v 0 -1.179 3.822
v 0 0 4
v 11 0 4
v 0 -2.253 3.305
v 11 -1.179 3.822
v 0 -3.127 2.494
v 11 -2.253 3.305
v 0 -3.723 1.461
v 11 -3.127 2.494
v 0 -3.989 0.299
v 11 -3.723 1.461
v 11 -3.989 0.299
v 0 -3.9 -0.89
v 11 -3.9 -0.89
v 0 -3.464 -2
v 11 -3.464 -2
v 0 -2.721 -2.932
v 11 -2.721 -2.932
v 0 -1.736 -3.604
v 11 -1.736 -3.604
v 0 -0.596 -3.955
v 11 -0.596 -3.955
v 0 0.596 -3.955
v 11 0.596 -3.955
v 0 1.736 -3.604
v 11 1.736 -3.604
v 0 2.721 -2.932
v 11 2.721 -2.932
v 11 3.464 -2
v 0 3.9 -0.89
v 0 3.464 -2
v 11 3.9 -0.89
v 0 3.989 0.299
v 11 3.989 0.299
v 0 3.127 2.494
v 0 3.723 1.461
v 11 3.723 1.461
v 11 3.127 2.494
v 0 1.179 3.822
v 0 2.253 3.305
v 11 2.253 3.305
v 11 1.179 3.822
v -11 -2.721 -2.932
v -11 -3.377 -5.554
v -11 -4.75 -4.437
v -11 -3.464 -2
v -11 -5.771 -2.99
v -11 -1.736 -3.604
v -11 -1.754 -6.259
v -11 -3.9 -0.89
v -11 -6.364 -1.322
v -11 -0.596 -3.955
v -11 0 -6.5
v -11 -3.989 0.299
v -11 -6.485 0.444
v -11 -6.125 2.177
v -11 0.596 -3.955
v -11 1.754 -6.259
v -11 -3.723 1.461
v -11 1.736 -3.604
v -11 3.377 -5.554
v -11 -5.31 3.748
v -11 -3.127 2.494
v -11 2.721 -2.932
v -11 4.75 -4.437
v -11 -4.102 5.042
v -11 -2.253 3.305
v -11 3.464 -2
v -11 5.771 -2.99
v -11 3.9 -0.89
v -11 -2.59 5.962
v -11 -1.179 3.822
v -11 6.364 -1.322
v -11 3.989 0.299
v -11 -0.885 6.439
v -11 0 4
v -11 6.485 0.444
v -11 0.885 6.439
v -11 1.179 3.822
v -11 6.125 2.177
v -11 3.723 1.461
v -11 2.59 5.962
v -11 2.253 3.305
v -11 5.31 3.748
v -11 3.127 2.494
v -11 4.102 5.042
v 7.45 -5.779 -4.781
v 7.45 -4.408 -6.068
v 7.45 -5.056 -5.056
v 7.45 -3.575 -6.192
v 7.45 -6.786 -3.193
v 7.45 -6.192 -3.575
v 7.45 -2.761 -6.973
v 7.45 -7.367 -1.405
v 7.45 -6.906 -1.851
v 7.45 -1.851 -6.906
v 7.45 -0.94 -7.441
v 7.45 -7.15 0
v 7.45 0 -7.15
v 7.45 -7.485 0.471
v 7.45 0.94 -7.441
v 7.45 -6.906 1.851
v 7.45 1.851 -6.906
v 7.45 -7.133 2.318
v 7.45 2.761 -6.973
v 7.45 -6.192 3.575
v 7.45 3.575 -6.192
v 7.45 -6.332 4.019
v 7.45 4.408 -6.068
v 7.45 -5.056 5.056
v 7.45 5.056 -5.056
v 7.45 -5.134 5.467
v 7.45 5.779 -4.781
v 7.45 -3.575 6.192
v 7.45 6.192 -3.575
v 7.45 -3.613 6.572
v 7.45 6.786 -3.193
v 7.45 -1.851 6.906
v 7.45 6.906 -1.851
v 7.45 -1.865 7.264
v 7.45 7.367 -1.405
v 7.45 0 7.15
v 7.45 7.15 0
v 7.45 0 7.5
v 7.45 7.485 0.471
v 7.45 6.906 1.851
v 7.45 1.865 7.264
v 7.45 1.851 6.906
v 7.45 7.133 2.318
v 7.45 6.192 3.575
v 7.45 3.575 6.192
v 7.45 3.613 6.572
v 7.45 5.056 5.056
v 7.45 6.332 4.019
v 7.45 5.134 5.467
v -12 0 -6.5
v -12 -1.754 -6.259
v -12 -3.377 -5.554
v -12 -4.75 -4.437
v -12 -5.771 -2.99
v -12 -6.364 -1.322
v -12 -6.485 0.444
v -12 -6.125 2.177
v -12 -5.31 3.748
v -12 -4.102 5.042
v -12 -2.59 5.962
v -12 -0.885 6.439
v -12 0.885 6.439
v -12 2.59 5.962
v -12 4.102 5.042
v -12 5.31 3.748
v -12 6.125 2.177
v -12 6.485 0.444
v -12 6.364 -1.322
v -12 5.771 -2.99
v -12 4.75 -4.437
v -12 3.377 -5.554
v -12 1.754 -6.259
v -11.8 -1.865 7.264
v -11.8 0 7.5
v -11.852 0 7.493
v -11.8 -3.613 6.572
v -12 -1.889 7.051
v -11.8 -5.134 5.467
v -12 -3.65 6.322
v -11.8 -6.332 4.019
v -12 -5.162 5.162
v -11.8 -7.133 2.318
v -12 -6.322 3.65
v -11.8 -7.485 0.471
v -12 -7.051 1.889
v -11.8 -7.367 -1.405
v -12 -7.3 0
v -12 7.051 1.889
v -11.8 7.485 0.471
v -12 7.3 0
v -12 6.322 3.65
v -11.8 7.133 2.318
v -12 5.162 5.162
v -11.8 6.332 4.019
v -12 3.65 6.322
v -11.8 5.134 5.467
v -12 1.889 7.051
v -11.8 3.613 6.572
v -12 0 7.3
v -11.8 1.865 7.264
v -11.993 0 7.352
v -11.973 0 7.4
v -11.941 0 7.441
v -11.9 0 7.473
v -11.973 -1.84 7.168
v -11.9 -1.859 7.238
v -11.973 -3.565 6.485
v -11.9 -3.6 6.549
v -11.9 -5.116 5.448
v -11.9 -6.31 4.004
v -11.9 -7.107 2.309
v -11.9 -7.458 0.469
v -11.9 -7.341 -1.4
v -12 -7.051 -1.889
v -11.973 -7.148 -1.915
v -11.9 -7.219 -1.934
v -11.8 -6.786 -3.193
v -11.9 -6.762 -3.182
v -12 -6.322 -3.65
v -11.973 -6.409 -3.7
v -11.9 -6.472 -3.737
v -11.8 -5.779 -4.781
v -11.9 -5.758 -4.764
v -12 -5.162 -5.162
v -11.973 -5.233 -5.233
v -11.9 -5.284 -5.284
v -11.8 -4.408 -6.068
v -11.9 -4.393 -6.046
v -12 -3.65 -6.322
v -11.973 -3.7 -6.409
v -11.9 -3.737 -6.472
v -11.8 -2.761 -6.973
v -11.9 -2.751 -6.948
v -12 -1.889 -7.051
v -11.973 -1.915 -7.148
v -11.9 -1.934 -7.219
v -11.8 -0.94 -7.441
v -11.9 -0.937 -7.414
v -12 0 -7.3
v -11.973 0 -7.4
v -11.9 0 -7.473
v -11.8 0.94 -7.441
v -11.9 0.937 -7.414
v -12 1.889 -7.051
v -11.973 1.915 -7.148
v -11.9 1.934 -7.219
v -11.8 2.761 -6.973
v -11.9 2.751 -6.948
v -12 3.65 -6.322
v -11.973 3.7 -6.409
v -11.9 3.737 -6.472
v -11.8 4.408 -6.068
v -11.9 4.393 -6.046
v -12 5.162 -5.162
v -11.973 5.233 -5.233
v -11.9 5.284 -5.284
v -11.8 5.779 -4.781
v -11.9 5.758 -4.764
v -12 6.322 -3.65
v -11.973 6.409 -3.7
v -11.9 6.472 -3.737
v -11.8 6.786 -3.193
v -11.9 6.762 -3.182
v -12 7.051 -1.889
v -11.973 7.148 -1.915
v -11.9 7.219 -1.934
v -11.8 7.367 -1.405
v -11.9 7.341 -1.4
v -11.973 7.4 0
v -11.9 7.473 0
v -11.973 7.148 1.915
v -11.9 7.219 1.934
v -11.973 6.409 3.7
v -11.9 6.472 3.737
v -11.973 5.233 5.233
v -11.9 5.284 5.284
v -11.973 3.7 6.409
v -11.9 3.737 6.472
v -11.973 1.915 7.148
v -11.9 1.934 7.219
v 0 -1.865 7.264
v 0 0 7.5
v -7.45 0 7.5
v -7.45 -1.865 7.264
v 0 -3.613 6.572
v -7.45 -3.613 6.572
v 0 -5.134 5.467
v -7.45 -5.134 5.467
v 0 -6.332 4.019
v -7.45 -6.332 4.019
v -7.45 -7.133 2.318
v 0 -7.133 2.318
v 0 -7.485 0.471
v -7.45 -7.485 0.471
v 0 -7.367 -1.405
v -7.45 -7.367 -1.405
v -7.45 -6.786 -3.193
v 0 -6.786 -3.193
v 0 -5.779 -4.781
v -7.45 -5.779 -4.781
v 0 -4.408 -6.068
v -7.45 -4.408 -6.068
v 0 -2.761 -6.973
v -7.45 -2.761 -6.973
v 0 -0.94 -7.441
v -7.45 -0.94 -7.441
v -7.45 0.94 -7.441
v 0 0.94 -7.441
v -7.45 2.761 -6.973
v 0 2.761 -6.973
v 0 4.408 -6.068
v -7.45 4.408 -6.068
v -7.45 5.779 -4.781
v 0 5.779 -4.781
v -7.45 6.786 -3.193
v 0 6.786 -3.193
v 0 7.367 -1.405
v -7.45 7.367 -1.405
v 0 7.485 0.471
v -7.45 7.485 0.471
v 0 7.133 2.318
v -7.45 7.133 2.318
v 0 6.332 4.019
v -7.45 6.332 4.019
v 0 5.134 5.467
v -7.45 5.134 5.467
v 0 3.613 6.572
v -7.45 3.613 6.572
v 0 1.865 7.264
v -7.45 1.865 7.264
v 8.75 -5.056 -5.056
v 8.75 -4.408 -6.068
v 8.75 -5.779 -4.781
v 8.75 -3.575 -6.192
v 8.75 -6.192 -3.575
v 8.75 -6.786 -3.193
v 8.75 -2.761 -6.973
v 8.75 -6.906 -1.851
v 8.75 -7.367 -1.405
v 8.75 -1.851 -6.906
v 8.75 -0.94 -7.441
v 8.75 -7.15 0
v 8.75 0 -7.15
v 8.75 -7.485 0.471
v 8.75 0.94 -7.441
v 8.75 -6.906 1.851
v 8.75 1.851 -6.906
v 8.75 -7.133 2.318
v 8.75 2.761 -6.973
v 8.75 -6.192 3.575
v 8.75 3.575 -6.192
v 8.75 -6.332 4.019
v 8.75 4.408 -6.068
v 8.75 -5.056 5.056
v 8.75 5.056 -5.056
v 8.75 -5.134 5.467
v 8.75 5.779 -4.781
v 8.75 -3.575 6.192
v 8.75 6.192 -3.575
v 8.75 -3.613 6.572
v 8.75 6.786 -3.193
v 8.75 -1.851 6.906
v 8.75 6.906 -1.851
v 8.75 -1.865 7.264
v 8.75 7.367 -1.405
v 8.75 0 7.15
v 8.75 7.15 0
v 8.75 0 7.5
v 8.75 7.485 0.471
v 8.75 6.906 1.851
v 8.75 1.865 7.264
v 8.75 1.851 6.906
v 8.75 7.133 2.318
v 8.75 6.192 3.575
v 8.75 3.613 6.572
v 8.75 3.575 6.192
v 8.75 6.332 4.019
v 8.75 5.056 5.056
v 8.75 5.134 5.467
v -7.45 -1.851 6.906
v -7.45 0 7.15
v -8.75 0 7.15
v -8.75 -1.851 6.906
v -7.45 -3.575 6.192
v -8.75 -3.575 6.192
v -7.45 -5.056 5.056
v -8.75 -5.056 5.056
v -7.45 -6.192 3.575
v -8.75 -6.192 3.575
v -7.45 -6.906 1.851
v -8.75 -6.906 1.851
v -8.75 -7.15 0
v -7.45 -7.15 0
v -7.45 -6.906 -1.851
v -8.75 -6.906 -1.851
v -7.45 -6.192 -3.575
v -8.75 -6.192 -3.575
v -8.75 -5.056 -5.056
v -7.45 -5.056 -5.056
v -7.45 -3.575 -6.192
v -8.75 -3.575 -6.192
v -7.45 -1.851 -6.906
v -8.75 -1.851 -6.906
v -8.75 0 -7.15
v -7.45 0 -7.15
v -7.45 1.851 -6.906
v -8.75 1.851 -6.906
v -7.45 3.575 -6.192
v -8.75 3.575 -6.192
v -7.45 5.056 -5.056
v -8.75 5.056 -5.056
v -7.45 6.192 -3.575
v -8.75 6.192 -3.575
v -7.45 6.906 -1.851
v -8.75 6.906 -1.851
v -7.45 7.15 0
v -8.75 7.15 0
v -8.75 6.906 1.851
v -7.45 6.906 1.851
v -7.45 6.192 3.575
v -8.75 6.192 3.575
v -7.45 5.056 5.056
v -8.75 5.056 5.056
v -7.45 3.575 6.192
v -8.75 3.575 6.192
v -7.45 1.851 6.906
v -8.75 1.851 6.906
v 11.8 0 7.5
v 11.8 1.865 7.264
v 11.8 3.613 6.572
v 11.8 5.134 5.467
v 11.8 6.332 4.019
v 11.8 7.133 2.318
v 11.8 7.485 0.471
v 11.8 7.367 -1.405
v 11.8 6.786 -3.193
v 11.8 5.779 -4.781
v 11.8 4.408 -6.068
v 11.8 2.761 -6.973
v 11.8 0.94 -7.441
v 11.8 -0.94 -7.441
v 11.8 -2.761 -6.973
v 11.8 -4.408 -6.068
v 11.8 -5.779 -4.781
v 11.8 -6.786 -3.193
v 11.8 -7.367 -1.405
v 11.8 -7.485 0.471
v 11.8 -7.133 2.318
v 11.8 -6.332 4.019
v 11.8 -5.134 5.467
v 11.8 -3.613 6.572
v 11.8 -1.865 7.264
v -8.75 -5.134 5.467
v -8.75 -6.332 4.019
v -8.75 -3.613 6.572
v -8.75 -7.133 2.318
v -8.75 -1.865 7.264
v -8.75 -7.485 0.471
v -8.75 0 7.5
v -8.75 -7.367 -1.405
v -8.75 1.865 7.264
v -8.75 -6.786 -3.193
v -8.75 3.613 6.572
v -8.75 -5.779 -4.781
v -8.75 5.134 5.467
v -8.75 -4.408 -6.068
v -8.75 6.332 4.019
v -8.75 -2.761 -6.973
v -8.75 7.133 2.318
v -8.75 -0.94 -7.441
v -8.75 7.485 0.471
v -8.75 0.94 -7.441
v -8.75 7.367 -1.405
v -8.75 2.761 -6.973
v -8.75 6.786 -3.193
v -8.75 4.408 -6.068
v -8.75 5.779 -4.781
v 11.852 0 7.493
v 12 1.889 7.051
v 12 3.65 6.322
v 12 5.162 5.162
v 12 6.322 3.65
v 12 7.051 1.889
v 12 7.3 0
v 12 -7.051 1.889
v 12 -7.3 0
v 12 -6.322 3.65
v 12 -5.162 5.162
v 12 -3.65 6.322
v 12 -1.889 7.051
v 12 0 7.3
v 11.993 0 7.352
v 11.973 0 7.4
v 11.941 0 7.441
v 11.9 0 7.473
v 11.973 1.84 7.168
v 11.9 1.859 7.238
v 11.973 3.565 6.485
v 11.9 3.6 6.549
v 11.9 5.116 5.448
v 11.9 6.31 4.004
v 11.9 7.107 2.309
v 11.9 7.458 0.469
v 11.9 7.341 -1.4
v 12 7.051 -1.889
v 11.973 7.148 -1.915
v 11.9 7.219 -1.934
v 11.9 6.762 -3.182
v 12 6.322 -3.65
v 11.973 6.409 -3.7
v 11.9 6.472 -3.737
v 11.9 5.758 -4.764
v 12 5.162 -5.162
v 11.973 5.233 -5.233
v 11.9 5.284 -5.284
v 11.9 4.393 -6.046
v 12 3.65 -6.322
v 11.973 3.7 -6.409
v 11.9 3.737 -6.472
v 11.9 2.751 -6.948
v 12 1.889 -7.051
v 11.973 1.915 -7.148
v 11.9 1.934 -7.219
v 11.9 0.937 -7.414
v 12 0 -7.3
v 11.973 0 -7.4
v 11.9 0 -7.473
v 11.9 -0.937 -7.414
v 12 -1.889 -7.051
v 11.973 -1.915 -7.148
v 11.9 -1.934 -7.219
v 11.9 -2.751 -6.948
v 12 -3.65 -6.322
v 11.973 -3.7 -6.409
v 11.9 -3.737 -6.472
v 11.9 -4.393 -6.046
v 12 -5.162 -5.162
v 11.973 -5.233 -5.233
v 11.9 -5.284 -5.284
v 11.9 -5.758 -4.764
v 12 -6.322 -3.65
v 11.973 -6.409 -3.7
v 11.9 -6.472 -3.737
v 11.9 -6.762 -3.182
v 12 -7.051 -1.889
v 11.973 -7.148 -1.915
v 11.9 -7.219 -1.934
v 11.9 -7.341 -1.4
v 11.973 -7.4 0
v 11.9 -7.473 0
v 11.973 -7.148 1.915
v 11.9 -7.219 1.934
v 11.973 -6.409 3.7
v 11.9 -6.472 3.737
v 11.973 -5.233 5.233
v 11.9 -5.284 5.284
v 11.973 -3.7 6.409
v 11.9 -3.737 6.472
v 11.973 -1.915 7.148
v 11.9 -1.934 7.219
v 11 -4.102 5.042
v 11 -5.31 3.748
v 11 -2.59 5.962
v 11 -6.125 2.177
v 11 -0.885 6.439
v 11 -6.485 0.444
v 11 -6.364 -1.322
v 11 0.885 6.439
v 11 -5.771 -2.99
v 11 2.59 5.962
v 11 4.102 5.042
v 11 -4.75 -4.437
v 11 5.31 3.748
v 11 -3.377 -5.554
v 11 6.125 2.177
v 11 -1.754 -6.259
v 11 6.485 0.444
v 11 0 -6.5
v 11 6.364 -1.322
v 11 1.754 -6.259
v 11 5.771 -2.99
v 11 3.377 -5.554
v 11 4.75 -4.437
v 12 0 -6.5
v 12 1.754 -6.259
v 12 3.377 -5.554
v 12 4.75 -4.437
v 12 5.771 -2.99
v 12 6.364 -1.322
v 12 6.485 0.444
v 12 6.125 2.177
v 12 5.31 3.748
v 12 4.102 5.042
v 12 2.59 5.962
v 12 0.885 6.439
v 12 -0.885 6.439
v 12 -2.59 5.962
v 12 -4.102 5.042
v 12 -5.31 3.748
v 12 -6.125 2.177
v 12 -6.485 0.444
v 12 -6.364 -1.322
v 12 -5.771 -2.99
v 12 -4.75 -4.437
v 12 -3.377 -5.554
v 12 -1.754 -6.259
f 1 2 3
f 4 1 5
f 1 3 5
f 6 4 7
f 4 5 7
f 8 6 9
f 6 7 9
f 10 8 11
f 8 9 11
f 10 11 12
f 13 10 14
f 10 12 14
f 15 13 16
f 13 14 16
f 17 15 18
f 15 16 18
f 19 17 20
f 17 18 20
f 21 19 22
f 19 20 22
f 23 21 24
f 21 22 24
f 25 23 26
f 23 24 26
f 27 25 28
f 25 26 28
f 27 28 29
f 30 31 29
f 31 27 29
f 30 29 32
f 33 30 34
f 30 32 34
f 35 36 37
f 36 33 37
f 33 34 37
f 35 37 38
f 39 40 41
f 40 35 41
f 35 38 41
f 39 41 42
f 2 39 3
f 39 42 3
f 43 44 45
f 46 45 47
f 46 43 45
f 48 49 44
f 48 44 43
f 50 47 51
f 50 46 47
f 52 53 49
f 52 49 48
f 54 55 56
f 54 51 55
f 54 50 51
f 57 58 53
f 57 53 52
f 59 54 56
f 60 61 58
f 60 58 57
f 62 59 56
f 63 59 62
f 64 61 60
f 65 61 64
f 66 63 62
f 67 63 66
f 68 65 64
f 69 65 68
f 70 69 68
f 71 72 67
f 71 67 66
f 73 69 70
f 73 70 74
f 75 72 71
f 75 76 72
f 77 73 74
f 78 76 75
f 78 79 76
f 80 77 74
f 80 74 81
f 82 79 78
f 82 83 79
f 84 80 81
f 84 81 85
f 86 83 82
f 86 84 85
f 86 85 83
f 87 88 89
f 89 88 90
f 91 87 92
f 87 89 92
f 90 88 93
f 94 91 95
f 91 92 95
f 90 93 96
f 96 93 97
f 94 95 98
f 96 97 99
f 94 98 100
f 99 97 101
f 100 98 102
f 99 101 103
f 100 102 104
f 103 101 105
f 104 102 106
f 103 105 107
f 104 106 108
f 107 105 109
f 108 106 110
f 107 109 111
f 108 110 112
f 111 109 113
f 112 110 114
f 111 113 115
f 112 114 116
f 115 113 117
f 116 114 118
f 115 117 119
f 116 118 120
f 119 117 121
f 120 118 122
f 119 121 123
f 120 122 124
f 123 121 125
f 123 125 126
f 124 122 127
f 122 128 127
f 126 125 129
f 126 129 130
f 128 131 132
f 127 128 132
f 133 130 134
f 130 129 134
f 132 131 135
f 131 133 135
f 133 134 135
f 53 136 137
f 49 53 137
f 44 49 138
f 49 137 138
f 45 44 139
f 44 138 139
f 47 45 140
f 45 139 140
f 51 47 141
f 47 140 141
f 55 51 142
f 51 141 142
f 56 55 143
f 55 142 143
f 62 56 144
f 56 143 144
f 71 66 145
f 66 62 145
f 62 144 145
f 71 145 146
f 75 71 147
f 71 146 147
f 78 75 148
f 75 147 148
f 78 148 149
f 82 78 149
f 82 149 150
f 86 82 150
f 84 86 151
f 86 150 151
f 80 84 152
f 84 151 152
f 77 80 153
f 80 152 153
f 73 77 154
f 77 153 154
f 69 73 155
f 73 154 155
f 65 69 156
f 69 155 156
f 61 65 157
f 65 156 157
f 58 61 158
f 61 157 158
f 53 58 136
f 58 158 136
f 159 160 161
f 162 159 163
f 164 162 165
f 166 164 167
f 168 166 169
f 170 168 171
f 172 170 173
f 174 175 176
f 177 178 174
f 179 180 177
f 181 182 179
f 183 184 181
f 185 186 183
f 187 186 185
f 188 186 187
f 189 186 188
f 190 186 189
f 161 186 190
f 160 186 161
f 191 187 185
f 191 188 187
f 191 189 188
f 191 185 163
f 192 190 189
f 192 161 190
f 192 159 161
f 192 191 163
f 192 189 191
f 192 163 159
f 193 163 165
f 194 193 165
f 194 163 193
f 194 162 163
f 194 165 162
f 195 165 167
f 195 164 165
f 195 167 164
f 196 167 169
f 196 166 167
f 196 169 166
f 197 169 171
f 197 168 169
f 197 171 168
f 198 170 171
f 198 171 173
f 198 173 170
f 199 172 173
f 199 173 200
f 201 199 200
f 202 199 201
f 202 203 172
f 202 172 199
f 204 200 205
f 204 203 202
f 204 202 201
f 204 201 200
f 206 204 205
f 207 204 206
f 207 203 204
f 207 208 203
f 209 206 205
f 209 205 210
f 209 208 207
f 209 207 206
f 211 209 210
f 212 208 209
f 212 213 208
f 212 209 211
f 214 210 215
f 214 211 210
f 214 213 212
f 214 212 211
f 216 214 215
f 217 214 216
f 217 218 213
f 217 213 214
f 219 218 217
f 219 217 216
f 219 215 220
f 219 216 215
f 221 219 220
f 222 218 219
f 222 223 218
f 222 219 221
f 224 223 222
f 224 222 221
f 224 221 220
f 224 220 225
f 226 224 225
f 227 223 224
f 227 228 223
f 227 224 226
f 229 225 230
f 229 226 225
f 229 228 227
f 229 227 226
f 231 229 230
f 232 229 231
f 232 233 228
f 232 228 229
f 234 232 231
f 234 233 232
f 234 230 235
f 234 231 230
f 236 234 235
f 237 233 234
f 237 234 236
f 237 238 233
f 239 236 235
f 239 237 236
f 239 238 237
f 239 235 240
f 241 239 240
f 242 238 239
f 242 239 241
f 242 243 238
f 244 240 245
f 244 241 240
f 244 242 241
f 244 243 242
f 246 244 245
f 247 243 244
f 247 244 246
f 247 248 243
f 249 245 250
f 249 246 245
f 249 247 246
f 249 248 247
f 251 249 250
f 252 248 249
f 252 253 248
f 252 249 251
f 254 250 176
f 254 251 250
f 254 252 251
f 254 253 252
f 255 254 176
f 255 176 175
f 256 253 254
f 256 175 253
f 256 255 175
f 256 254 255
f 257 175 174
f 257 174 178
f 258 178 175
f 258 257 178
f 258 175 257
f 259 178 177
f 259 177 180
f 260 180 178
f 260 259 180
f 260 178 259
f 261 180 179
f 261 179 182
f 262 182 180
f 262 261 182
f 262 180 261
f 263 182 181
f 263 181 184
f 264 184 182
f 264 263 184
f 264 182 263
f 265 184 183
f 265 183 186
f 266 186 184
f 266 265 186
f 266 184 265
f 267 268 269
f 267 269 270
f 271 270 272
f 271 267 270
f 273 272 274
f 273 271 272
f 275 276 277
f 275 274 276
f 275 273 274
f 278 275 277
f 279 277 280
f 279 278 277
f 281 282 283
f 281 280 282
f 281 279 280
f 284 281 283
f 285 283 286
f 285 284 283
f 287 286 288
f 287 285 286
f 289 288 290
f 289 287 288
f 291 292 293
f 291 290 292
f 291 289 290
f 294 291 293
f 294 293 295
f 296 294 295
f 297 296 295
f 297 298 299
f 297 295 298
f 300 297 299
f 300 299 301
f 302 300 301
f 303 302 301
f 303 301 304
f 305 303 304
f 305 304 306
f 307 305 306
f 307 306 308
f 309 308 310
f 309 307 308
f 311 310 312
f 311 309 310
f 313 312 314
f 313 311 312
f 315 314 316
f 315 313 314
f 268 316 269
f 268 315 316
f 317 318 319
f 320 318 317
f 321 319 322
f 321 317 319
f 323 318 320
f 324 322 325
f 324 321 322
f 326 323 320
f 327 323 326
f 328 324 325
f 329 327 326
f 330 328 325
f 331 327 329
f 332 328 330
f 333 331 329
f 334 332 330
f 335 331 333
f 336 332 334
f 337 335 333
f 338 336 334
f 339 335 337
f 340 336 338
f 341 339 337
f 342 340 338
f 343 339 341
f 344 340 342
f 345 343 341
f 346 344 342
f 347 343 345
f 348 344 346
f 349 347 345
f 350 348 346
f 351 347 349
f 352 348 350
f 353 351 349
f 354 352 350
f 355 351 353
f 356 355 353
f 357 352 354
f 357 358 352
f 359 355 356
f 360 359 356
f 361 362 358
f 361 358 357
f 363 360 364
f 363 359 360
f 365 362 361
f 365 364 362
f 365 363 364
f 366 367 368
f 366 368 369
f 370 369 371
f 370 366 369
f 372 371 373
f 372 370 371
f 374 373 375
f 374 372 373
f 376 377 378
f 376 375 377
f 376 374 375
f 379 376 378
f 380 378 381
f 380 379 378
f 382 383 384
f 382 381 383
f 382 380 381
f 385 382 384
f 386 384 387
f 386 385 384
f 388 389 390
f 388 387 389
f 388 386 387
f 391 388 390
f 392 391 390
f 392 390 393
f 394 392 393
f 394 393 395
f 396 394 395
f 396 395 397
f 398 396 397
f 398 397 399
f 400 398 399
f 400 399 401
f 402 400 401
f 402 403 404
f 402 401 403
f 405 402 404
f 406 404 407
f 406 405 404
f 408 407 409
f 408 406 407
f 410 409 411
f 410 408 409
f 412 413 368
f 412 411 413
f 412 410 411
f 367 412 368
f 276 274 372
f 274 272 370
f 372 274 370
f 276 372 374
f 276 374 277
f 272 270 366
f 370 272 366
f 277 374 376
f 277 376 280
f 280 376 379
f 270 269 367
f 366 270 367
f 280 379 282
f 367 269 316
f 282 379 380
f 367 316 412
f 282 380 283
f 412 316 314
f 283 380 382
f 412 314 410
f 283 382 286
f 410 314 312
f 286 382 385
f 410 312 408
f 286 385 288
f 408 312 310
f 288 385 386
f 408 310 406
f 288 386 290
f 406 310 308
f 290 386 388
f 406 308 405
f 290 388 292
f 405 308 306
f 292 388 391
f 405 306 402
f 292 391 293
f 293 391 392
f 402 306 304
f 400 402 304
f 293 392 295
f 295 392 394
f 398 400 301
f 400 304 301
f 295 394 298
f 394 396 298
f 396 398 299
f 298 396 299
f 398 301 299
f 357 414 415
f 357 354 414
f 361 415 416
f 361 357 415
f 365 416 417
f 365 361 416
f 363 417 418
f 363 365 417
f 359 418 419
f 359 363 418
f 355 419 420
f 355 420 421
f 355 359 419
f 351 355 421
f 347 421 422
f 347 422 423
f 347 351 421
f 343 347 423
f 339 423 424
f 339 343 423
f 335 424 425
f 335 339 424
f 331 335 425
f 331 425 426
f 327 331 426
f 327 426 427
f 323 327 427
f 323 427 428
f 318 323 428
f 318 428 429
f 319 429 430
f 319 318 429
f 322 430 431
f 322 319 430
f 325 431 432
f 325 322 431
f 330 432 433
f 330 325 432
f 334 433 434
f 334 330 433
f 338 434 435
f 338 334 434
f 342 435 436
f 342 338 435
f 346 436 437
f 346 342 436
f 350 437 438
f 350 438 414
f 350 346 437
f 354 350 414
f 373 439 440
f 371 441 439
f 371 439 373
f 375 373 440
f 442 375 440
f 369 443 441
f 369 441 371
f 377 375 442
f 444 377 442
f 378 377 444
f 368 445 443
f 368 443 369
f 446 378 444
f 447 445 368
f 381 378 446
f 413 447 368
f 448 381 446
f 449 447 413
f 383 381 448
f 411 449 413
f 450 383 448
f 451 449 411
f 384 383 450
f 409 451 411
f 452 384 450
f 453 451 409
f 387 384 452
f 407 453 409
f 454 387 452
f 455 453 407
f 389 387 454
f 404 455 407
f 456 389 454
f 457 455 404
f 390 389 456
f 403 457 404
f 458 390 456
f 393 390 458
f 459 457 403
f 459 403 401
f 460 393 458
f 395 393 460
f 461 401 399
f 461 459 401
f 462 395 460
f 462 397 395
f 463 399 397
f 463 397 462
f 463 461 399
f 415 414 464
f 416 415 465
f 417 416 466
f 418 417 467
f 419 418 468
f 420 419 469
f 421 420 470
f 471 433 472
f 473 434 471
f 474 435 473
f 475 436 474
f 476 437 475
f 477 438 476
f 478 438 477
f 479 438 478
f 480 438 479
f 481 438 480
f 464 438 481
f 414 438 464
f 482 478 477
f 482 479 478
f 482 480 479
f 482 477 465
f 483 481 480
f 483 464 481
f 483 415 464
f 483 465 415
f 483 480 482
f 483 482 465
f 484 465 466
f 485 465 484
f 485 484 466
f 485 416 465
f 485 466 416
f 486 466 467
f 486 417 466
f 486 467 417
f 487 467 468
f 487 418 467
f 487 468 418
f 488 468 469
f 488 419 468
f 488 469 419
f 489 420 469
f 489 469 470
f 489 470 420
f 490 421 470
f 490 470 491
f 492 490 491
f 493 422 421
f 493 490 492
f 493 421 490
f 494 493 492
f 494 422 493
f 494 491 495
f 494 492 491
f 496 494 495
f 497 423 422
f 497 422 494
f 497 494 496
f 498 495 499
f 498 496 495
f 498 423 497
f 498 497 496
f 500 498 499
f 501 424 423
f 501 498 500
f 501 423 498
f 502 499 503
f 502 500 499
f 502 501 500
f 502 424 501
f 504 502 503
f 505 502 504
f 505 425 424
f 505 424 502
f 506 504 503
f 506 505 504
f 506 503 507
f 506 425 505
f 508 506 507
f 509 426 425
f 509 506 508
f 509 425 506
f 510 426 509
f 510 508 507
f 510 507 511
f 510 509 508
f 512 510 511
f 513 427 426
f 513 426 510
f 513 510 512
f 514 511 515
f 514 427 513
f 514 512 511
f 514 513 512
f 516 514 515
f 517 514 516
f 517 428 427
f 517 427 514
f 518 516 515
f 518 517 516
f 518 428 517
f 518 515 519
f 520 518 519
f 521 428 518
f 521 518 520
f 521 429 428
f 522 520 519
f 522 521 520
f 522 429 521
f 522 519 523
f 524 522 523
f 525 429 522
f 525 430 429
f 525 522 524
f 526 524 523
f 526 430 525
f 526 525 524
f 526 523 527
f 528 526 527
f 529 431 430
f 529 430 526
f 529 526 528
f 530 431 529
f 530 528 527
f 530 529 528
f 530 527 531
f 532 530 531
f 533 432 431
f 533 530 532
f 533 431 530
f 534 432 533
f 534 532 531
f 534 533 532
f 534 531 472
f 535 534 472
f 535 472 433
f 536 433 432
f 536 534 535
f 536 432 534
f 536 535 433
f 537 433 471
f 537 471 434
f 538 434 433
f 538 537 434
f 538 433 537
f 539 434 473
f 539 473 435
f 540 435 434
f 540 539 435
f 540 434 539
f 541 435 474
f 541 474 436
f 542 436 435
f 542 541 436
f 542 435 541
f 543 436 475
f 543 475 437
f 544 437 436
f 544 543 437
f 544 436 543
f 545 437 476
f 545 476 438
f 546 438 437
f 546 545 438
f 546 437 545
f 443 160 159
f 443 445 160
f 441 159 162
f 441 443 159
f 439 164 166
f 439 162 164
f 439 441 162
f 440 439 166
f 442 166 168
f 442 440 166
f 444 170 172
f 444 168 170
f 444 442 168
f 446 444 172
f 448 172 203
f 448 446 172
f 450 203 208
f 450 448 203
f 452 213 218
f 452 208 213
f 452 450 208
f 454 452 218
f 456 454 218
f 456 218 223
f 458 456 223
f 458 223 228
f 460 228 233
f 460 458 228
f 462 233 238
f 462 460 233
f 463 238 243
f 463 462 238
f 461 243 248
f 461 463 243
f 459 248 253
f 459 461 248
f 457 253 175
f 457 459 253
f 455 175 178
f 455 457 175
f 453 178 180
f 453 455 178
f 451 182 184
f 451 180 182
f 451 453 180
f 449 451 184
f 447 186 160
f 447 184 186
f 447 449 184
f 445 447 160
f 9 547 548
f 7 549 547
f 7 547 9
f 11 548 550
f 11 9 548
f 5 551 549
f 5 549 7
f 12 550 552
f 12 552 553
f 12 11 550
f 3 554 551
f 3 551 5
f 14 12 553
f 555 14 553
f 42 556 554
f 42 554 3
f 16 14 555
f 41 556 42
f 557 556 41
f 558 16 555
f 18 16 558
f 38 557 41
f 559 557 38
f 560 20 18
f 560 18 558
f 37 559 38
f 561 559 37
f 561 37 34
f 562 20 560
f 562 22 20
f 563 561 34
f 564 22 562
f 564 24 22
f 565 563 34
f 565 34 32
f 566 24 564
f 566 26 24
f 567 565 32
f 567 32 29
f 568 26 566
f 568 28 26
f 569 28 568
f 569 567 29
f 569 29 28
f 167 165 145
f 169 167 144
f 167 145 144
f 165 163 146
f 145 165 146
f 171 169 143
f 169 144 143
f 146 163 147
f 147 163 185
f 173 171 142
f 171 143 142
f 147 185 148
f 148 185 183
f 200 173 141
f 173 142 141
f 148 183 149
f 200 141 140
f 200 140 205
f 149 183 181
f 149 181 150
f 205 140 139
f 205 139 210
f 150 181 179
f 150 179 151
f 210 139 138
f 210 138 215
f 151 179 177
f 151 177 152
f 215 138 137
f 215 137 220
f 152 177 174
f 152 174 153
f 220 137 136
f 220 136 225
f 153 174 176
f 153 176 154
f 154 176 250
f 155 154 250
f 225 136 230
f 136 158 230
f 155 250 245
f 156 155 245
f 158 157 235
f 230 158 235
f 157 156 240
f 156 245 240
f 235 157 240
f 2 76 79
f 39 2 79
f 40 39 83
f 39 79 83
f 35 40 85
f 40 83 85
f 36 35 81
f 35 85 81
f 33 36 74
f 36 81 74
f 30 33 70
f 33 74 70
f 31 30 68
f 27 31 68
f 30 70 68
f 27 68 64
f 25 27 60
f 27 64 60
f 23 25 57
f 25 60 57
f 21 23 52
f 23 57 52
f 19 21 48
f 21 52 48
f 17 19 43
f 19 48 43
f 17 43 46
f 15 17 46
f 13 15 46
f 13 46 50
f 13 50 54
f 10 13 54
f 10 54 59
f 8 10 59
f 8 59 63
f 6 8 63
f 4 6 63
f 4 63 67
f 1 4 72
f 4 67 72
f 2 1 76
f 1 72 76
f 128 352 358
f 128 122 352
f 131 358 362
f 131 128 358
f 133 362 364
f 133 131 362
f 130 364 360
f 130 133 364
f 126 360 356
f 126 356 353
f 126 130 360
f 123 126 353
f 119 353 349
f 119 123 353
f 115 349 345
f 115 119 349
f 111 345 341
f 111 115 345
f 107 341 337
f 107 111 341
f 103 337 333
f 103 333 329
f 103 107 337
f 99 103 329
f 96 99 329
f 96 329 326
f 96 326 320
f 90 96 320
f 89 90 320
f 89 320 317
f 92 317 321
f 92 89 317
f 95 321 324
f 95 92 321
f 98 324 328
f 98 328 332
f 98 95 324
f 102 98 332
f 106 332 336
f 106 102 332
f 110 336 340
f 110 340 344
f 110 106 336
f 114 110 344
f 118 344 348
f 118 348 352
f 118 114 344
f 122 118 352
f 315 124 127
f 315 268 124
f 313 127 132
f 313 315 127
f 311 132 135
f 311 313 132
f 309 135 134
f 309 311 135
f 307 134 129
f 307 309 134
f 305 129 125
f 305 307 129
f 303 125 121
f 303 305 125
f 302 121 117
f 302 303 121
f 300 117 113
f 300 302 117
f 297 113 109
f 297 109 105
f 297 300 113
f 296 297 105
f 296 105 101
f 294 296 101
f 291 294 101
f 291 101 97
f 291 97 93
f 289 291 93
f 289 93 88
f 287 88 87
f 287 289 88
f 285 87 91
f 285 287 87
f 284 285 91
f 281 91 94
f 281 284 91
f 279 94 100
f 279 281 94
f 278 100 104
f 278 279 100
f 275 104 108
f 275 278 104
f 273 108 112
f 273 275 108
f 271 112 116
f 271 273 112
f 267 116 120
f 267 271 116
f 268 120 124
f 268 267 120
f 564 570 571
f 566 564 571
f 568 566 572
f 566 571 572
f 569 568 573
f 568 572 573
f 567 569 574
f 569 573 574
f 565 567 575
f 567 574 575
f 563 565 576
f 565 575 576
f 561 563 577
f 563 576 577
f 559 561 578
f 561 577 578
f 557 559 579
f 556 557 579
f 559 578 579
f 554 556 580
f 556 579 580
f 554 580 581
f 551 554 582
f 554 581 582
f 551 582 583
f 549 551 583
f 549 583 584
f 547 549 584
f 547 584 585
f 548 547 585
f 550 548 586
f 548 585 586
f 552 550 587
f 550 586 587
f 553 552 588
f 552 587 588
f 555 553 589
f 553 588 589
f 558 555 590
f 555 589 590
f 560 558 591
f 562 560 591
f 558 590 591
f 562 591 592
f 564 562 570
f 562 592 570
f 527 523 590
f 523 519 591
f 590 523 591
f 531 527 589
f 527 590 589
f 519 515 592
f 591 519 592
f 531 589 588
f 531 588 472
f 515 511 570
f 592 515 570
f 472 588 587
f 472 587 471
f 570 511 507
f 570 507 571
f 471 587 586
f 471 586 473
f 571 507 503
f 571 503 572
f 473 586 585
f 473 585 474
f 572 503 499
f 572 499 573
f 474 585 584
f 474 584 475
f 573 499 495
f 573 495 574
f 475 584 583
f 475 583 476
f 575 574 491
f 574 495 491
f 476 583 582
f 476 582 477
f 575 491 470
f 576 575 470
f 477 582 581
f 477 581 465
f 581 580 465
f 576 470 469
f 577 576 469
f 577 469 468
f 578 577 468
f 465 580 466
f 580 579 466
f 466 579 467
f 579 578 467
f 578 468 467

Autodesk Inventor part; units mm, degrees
ref_plane "YZ Plane" through (0, 0, 0) normal (1, 0, 0) x (0, 1, 0)
ref_plane "XZ Plane" through (0, 0, 0) normal (0, 1, 0) x (-1, 0, 0)
ref_plane "XY Plane" through (0, 0, 0) normal (0, 0, 1) x (1, 0, 0)
sketch "Schizzo1" plane through (0, 0, 0) normal (0, 1, 0) x (-1, 0, 0)
  line L0 (-12, 4) -> (-12, 7.5)
  line L1 (-12, 7.5) -> (-8.75, 7.5)
  line L2 (-8.75, 7.5) -> (-8.75, 7.15)
  line L3 (-8.75, 7.15) -> (-7.45, 7.15)
  line L4 (-7.45, 7.15) -> (-7.45, 7.5)
  line L5 (-7.45, 7.5) -> (0, 7.5)
  line L6 (0, 7.5) -> (0, 4)
  line L7 (0, 4) -> (-12, 4)
  line L8 (0, 0) -> (5.7518, 0)
  dimension "d0" = 8
  dimension "d2" = 15
  dimension "d3" = 12
  dimension "d4" = 8.75
  dimension "d5" = 1.3
  dimension "d6" = 14.3
revolve "Rivoluzione1" add sketch "Schizzo1" angle 360 about axis through (0, 0, 0) along (-1, 0, 0)
fillet "Raccordo1" radius 0.2 1 edges at (12, 0, -7.5)
sketch "Schizzo2" plane through (12, 0, 0) normal (1, 0, 0) x (0, 0, -1)
  circle A0 centre (0, 0) radius 7.3 projected
  circle A1 centre (0, 0) radius 6.5
  dimension "d13" = 13
extrude "Estrusione2" cut sketch "Schizzo2" against normal blind 1 contours A1
mirror "Specchio1" about plane through (0, 0, 5.75) normal (-1, 0, 0)
properties part number "LM8UU"
